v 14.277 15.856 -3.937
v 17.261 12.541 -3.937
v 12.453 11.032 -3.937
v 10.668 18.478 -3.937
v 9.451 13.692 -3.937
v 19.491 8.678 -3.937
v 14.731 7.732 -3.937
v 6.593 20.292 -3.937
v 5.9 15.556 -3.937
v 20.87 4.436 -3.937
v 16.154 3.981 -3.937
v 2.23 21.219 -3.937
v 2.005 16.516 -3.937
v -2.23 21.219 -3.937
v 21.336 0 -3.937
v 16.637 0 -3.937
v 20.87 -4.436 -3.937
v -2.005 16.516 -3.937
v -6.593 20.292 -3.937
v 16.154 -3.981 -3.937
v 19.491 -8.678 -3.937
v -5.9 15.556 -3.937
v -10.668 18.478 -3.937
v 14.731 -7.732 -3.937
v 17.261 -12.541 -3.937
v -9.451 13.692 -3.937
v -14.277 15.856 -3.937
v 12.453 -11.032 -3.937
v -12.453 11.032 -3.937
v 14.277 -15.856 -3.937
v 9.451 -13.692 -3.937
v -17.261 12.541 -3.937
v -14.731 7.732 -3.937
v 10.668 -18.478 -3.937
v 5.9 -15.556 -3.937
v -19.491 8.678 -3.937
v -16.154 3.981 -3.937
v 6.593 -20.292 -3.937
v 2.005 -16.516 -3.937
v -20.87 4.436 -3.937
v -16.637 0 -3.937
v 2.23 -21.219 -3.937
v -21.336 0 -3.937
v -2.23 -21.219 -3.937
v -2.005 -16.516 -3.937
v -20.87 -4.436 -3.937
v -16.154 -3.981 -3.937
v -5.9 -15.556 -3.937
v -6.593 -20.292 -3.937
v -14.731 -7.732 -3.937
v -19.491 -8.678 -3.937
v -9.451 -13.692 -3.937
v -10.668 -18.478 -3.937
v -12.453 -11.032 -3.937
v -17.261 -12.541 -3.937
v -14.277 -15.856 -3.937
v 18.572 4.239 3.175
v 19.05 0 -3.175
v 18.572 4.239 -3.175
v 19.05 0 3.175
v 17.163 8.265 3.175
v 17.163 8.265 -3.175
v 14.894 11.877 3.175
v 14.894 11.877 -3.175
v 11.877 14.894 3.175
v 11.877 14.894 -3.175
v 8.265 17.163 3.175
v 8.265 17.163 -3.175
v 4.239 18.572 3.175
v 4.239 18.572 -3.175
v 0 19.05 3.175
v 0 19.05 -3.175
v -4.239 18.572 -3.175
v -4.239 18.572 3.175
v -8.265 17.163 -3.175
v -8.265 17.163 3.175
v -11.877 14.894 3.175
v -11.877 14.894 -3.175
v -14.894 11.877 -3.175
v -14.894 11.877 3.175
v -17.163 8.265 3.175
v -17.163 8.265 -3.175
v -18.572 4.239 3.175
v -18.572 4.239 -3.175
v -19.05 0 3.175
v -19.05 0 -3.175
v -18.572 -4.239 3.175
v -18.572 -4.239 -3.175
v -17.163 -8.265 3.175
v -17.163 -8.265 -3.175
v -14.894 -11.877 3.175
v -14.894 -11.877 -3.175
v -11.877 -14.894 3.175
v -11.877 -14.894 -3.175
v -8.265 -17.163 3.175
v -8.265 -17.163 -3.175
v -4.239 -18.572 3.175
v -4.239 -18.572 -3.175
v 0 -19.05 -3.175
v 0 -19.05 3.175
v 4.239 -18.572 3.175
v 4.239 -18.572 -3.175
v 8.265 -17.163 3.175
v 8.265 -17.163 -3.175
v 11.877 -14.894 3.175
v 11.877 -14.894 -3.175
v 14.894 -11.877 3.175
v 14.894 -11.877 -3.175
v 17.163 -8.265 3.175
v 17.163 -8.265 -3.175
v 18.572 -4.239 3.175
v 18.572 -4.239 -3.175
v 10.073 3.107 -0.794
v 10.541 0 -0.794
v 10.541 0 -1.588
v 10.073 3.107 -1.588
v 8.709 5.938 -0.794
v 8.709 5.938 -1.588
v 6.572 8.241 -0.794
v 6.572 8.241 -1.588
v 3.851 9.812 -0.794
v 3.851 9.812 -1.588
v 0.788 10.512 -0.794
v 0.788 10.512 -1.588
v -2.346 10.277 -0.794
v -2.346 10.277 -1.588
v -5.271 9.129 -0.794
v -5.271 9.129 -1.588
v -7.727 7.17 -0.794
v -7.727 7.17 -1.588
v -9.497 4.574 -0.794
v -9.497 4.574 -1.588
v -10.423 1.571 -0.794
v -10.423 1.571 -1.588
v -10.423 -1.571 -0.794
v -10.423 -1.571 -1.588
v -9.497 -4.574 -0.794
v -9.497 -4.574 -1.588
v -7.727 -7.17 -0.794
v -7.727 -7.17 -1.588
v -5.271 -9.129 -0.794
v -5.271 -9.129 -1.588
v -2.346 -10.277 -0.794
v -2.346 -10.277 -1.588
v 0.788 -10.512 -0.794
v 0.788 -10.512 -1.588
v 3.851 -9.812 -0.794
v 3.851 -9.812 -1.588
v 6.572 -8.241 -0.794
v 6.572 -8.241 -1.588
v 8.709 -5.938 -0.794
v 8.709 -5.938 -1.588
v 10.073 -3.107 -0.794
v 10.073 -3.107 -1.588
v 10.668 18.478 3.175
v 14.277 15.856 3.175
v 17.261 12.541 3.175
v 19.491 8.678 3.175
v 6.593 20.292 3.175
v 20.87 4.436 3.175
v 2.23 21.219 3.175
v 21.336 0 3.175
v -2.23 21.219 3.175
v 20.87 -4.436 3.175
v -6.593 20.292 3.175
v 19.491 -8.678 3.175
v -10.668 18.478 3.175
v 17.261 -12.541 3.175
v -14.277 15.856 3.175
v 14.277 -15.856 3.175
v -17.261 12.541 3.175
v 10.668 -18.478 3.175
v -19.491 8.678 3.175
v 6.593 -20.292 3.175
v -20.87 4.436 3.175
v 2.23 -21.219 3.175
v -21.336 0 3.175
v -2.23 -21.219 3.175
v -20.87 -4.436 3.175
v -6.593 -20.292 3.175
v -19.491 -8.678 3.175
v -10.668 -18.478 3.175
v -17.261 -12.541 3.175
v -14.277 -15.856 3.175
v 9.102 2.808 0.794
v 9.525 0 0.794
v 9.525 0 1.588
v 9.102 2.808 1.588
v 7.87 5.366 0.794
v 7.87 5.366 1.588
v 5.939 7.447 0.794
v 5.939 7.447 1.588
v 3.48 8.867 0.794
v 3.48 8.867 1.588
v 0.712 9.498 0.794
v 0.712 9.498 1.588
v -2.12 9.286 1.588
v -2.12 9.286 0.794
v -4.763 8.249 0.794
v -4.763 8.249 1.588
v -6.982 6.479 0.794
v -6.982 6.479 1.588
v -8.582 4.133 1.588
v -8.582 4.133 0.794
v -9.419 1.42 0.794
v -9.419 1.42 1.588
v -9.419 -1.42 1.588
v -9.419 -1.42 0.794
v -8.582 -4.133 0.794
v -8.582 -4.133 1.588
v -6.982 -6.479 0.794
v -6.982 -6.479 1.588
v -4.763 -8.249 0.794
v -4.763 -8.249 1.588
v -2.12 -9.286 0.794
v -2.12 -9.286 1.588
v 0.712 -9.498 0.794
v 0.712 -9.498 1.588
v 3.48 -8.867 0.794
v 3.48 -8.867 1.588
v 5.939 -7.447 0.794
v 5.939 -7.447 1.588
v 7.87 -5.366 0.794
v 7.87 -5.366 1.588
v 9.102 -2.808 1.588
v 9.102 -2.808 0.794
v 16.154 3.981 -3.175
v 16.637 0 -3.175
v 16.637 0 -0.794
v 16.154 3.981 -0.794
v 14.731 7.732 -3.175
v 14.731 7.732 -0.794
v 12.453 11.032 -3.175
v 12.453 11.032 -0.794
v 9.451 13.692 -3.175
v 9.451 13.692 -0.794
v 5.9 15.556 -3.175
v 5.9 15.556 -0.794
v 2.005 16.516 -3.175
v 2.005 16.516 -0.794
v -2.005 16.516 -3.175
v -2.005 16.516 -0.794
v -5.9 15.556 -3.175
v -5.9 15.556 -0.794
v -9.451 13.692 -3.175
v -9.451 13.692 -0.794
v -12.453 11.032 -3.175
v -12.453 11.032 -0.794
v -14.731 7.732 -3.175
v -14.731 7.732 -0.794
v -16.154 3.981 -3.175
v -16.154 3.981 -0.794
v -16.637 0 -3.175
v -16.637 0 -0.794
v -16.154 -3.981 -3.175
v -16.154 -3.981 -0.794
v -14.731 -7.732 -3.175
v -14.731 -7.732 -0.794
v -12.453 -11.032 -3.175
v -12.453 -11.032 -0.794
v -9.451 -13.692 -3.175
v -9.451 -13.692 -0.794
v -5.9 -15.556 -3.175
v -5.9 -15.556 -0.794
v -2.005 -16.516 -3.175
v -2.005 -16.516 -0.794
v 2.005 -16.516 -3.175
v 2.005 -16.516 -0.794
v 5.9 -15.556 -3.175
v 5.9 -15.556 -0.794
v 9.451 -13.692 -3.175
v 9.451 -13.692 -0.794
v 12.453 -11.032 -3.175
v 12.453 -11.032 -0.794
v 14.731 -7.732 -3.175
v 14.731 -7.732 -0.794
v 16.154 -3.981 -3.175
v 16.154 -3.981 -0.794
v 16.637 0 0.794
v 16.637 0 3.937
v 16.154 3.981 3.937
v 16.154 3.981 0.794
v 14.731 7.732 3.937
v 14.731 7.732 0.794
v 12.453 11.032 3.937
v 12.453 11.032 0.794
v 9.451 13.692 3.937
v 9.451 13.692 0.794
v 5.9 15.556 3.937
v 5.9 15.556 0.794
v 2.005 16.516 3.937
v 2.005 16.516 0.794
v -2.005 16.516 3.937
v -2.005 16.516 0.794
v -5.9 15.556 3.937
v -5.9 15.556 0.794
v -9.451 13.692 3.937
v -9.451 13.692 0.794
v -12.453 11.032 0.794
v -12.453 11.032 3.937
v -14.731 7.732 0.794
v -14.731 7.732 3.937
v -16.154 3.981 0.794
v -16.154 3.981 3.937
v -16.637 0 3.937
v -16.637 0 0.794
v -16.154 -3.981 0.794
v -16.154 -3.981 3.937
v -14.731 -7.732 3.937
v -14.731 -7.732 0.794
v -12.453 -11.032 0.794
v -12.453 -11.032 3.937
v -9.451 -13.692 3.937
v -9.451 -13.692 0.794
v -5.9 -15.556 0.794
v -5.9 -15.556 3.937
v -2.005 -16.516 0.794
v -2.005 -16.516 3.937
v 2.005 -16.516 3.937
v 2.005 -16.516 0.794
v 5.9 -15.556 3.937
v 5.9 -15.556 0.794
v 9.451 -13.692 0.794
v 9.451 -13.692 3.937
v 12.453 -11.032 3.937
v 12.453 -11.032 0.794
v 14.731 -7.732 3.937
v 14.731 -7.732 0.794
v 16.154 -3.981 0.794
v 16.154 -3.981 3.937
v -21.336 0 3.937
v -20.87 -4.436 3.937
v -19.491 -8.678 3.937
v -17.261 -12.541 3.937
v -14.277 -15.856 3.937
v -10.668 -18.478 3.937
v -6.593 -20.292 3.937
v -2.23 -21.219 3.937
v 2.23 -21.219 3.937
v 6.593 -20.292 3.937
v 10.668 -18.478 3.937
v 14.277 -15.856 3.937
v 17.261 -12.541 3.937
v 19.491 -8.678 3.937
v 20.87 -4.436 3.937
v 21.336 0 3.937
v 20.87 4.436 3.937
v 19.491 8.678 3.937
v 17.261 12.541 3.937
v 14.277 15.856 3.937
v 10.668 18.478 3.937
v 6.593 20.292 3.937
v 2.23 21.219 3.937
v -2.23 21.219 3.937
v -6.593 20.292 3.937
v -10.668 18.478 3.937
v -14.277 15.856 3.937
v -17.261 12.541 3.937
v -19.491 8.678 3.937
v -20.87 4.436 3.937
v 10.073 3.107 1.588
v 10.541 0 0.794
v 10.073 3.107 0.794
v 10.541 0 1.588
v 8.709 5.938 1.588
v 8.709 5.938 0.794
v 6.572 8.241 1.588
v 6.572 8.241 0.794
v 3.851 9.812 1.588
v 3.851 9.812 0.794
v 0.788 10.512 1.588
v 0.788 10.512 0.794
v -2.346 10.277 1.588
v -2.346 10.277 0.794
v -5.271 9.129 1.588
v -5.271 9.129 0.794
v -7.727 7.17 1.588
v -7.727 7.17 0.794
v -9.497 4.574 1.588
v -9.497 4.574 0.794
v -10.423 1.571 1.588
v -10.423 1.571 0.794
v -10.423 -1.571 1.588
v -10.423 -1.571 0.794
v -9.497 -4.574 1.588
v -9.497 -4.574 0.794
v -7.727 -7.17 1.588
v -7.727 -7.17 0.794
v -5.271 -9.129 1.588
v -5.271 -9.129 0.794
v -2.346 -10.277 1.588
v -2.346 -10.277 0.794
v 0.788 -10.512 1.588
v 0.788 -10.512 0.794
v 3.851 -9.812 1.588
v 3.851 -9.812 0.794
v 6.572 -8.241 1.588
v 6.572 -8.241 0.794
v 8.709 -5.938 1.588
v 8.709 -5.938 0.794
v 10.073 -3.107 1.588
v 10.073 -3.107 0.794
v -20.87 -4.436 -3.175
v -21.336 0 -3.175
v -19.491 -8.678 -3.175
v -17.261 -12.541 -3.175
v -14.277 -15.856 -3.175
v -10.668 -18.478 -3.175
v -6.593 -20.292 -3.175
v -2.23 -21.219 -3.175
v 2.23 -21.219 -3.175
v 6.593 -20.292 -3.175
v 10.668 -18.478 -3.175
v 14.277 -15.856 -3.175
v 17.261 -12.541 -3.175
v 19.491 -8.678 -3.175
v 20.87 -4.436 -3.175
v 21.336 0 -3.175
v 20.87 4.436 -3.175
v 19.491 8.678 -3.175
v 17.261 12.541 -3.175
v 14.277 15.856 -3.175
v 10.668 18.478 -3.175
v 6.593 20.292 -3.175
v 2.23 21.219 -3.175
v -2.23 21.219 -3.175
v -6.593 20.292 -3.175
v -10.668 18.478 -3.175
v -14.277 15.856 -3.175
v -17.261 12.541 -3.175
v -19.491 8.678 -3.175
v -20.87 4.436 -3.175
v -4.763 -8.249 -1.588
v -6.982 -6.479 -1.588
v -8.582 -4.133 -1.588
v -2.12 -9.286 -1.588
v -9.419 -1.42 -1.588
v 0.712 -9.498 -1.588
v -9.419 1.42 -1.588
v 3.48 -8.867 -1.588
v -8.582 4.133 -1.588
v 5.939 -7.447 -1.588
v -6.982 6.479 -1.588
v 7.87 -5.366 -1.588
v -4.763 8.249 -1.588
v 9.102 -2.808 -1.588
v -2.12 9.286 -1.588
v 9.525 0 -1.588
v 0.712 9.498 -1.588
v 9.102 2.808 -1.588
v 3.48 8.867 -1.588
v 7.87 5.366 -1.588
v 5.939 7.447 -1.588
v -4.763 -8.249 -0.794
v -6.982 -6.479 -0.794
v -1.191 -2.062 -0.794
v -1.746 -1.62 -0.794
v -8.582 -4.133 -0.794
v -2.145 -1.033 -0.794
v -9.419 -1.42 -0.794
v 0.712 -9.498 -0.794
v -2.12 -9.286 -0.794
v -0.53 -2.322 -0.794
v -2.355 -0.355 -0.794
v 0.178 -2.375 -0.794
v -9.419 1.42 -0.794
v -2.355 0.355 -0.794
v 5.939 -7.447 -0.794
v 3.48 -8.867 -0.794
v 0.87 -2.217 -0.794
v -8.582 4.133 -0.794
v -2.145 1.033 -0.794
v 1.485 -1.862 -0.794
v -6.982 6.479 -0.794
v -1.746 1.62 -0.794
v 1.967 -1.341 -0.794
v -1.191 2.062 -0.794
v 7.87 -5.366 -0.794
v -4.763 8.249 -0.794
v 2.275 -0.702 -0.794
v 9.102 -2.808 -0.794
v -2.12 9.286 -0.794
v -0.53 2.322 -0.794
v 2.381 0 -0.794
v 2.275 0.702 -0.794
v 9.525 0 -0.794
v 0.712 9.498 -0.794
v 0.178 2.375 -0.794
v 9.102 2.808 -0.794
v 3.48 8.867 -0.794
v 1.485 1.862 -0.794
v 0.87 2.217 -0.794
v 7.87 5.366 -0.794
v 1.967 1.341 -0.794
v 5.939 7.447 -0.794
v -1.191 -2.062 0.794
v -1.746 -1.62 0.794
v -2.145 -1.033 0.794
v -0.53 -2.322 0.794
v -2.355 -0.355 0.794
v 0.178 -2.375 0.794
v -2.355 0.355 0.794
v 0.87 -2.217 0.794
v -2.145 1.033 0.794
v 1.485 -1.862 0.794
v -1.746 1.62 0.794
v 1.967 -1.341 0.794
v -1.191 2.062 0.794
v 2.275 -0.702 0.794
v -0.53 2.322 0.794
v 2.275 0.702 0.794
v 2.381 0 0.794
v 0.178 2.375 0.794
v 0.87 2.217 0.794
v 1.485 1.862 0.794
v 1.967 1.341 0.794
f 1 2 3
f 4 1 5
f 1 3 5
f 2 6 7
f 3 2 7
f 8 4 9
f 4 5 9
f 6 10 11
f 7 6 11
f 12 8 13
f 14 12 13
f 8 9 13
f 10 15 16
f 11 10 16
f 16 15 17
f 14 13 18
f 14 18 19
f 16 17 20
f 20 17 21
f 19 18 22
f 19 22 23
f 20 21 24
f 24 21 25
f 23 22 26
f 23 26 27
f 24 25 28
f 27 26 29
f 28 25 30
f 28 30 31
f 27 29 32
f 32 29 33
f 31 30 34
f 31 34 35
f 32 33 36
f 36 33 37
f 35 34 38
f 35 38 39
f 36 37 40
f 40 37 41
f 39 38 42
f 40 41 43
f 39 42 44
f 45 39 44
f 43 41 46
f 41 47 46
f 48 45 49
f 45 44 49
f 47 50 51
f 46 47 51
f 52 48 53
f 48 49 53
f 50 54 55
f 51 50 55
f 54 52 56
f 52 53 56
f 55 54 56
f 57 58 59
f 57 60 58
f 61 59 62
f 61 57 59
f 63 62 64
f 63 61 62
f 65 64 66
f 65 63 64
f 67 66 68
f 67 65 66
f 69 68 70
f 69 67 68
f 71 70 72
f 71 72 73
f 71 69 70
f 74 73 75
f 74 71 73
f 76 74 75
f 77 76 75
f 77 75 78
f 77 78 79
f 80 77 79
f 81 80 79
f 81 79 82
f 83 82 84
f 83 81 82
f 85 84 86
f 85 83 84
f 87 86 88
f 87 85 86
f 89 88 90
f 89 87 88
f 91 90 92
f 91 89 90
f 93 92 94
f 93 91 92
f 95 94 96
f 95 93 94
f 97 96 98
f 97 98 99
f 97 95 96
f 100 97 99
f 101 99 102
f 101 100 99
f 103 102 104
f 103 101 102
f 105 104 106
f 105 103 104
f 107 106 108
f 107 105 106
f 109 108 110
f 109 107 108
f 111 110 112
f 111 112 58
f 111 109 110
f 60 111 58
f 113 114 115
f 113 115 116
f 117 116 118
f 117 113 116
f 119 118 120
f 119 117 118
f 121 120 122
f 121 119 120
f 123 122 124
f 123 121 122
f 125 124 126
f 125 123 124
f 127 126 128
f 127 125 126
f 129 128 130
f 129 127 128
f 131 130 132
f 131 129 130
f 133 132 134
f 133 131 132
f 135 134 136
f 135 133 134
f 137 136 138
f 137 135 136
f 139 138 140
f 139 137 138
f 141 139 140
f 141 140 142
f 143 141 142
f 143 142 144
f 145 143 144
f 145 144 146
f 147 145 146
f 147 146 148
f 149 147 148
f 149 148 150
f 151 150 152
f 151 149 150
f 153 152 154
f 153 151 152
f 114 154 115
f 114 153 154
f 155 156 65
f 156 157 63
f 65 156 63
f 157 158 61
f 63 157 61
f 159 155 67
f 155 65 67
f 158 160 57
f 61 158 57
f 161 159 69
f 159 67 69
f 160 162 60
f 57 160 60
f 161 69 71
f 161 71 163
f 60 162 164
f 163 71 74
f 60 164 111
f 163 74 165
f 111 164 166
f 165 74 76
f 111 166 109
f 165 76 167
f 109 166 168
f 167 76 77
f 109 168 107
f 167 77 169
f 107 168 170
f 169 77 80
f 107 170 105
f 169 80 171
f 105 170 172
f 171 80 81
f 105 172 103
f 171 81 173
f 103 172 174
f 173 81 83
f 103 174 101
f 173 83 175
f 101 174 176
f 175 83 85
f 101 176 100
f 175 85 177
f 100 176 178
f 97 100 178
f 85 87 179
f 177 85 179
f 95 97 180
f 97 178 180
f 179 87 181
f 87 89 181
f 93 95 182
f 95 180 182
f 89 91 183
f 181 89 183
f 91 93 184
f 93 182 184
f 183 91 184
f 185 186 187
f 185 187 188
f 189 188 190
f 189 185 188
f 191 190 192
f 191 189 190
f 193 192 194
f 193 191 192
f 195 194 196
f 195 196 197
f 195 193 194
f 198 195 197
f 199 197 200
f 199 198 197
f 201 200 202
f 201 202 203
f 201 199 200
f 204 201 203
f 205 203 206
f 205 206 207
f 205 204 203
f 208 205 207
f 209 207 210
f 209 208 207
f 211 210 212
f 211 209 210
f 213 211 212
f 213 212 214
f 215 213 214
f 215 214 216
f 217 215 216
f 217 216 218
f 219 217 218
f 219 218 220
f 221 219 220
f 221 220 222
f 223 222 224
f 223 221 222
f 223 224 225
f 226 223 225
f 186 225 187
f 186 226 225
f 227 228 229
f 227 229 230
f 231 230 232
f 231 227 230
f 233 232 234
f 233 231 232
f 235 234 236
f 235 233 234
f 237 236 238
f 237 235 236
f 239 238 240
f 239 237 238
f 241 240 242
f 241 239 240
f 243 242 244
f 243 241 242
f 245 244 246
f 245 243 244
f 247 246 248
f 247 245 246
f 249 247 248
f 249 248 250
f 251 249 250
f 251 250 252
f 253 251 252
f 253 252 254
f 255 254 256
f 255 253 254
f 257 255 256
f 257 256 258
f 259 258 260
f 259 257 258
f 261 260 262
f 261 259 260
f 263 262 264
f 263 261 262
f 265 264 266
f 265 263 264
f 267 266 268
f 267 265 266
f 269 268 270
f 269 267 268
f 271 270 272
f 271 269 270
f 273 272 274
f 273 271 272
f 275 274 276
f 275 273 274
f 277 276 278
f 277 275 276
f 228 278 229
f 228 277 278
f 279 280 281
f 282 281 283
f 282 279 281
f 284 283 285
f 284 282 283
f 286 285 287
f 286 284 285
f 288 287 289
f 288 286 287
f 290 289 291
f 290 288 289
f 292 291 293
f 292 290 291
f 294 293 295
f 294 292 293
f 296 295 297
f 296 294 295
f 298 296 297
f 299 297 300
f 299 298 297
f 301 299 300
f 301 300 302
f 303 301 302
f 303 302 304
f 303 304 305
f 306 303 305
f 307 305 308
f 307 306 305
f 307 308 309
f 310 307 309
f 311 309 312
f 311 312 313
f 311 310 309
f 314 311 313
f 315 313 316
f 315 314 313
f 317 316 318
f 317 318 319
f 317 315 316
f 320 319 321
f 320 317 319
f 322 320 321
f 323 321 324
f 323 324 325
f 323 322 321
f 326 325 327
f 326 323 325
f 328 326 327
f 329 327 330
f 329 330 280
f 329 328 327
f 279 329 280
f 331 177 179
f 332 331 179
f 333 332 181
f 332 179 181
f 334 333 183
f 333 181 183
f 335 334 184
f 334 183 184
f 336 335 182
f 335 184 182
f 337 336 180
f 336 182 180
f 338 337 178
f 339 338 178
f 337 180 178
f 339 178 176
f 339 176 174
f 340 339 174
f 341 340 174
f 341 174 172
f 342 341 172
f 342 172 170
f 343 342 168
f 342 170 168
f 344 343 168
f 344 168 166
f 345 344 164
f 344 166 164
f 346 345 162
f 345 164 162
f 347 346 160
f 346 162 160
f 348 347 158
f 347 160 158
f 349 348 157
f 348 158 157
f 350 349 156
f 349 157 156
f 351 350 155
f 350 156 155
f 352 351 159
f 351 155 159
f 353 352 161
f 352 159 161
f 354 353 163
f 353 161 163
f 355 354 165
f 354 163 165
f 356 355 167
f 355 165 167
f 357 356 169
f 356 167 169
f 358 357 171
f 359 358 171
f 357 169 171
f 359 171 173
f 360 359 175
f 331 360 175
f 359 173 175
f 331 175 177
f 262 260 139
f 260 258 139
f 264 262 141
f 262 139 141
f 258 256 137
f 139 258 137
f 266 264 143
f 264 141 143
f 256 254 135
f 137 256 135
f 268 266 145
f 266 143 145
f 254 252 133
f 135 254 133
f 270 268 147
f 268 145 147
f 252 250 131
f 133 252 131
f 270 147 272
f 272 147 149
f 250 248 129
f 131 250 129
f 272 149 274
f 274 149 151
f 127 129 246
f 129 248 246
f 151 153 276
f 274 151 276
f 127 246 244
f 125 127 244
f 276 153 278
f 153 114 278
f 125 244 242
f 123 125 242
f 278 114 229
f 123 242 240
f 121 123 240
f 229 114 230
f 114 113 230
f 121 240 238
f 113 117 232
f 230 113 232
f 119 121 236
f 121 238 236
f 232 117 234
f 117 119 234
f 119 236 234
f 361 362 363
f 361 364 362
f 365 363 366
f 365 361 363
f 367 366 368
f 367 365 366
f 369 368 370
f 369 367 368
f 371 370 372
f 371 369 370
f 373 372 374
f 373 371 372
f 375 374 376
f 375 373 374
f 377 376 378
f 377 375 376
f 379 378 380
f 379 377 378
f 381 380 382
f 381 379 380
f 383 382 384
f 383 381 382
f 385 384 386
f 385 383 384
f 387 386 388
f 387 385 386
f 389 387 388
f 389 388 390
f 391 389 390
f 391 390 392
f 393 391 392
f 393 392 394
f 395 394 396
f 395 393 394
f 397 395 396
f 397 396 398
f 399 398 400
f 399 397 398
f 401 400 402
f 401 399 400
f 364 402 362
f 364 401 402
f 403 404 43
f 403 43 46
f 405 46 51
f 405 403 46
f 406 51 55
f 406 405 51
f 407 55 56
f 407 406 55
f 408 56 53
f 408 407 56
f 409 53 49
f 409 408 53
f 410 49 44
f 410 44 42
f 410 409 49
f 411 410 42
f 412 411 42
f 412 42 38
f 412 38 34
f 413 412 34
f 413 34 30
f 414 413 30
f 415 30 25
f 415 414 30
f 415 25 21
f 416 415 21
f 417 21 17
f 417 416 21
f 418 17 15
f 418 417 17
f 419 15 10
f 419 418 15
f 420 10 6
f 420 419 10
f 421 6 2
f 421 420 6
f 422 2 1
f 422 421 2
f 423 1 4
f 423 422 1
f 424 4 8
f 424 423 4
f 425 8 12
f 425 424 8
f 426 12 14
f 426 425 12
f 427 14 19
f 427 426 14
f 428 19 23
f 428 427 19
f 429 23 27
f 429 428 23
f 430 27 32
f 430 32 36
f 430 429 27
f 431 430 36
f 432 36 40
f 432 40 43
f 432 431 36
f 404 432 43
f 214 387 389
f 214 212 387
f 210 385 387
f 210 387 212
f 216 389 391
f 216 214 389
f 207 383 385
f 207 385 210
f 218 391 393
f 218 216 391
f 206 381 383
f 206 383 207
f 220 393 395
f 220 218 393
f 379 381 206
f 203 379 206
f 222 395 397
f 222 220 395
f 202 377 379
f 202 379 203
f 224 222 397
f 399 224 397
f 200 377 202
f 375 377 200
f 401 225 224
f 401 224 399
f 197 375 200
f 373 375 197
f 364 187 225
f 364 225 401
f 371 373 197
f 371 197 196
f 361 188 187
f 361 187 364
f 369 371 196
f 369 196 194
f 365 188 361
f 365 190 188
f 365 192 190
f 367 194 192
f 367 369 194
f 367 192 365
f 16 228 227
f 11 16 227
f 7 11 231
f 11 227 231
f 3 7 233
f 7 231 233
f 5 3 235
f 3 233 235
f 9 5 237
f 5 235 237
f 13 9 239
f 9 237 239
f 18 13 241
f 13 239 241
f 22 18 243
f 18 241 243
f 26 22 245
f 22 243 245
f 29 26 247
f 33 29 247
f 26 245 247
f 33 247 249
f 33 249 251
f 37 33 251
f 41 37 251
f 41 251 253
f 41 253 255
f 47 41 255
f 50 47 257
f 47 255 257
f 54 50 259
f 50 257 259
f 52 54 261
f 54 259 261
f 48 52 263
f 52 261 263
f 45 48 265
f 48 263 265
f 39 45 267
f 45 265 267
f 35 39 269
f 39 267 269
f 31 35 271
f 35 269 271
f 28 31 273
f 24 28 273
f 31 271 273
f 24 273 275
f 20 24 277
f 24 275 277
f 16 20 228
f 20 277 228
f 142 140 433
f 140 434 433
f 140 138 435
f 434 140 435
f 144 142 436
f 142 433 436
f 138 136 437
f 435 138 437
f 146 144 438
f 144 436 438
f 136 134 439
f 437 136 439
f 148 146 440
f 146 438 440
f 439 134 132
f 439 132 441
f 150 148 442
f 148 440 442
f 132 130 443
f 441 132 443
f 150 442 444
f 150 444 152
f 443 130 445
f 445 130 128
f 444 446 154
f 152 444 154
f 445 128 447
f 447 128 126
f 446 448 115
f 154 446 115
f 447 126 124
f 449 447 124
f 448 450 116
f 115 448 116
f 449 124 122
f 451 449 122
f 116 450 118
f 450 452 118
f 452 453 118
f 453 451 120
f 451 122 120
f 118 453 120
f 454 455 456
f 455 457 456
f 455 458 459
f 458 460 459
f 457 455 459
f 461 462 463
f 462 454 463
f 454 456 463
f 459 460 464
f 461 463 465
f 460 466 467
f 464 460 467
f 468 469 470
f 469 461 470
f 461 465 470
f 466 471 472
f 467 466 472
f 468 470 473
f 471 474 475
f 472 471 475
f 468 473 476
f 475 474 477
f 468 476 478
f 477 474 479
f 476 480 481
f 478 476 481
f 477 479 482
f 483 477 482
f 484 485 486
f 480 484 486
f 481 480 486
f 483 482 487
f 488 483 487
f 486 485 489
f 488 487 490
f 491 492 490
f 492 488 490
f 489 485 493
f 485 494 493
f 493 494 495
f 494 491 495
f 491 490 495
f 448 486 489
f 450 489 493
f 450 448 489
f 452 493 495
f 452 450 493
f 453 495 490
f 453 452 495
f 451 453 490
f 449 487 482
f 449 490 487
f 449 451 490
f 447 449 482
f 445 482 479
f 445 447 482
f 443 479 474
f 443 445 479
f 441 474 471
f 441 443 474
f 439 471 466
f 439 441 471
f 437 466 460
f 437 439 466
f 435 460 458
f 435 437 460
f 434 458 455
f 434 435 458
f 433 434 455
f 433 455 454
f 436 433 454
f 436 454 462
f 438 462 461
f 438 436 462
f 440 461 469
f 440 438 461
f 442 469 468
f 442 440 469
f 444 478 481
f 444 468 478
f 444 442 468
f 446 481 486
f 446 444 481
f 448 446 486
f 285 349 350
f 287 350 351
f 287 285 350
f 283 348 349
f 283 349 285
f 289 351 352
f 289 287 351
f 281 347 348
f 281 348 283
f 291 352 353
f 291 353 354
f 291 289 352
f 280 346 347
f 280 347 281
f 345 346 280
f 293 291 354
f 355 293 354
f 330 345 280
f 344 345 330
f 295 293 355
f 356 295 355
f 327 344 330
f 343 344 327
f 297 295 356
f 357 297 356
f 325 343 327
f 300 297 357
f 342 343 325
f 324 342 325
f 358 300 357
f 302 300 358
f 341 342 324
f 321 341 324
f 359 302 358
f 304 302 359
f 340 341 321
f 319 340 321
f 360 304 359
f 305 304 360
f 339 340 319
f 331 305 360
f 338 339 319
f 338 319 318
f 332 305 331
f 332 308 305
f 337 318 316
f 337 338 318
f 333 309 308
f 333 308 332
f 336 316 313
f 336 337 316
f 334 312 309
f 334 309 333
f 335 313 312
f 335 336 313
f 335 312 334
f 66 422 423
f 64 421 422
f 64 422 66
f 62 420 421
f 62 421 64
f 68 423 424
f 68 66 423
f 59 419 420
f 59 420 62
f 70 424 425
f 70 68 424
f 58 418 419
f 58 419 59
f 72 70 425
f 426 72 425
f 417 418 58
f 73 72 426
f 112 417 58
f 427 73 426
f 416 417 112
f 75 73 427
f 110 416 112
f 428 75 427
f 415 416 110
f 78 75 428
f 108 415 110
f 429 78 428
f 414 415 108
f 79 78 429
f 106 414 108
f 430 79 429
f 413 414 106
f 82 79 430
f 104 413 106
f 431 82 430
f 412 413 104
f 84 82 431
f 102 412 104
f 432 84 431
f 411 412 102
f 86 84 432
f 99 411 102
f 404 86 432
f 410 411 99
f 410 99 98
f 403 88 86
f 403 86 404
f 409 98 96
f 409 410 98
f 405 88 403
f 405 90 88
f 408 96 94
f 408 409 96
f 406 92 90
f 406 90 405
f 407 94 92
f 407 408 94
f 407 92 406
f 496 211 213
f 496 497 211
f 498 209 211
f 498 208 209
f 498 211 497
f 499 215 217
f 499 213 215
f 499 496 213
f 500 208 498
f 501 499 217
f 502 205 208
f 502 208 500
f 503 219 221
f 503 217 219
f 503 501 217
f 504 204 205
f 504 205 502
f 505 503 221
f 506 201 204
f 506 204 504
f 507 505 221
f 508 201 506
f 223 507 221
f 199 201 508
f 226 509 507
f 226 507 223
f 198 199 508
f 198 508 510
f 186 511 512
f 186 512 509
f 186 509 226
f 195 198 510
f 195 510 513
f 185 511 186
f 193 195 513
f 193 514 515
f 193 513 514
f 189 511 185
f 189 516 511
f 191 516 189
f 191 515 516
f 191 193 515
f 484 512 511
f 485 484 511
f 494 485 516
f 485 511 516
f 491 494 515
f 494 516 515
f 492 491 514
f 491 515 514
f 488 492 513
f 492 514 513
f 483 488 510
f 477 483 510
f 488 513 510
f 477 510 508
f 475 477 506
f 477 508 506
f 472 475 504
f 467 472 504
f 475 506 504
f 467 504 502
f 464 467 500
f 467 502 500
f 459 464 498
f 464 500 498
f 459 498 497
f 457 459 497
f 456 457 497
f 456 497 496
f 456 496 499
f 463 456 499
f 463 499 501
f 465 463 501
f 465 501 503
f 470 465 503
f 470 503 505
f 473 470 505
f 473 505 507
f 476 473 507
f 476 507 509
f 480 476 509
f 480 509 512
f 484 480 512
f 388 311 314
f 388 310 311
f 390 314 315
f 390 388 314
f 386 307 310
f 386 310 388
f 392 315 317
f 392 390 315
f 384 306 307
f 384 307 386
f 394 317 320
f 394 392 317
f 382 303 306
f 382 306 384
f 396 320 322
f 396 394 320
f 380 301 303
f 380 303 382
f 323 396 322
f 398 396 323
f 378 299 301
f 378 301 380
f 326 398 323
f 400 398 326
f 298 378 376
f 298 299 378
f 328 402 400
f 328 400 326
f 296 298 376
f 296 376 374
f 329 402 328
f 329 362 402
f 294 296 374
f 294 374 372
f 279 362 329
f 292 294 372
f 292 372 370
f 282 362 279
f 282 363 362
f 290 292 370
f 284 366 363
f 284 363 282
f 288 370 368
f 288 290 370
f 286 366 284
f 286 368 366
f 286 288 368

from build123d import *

# Parameters (mm, degrees)
SKETCH1_R           = 19.05
BOSS_EXTRUDE1_DEPTH = 0.79375
SKETCH3_R           = 19.05
SKETCH3_R_2         = 16.637
BOSS_EXTRUDE2_DEPTH = 3.175
SKETCH4_R           = 10.541
SKETCH4_R_2         = 9.525
BOSS_EXTRUDE3_DEPTH = 1.5875
SKETCH6_R           = 2.38125
CUT_EXTRUDE4_DEPTH  = 28.231525417
SKETCH7_R           = 21.336
SKETCH7_R_2         = 16.637
BOSS_EXTRUDE5_DEPTH = 0.762


with BuildPart() as part:
    # Sketch1 → Boss-Extrude1 (new, symmetric)
    with BuildSketch(Plane.XY):
        Circle(SKETCH1_R)
    extrude(amount=BOSS_EXTRUDE1_DEPTH, both=True)

    # Sketch3 → Boss-Extrude2 (add, symmetric)
    with BuildSketch(Plane.XY):
        Circle(SKETCH3_R)
        Circle(SKETCH3_R_2, mode=Mode.SUBTRACT)
    extrude(amount=BOSS_EXTRUDE2_DEPTH, both=True)

    # Sketch4 → Boss-Extrude3 (add, symmetric)
    with BuildSketch(Plane.XY):
        Circle(SKETCH4_R)
        Circle(SKETCH4_R_2, mode=Mode.SUBTRACT)
    extrude(amount=BOSS_EXTRUDE3_DEPTH, both=True)

    # Sketch6 → Cut-Extrude4 (cut, through all)
    with BuildSketch(Plane.XY.offset(0.79375)):
        Circle(SKETCH6_R)
    extrude(amount=-CUT_EXTRUDE4_DEPTH, mode=Mode.SUBTRACT)

    # Sketch7 → Boss-Extrude5 (add)
    with BuildSketch(Plane.XY.offset(3.175)):
        with Locations(Location((0, 0, 0), (0, 0, 180))):
            Circle(SKETCH7_R)
        Circle(SKETCH7_R_2, mode=Mode.SUBTRACT)
    boss_extrude5 = extrude(amount=BOSS_EXTRUDE5_DEPTH)

    # Mirror3: Boss-Extrude5 across plane
    add(boss_extrude5.mirror(Plane.XY))


solid = part.part
